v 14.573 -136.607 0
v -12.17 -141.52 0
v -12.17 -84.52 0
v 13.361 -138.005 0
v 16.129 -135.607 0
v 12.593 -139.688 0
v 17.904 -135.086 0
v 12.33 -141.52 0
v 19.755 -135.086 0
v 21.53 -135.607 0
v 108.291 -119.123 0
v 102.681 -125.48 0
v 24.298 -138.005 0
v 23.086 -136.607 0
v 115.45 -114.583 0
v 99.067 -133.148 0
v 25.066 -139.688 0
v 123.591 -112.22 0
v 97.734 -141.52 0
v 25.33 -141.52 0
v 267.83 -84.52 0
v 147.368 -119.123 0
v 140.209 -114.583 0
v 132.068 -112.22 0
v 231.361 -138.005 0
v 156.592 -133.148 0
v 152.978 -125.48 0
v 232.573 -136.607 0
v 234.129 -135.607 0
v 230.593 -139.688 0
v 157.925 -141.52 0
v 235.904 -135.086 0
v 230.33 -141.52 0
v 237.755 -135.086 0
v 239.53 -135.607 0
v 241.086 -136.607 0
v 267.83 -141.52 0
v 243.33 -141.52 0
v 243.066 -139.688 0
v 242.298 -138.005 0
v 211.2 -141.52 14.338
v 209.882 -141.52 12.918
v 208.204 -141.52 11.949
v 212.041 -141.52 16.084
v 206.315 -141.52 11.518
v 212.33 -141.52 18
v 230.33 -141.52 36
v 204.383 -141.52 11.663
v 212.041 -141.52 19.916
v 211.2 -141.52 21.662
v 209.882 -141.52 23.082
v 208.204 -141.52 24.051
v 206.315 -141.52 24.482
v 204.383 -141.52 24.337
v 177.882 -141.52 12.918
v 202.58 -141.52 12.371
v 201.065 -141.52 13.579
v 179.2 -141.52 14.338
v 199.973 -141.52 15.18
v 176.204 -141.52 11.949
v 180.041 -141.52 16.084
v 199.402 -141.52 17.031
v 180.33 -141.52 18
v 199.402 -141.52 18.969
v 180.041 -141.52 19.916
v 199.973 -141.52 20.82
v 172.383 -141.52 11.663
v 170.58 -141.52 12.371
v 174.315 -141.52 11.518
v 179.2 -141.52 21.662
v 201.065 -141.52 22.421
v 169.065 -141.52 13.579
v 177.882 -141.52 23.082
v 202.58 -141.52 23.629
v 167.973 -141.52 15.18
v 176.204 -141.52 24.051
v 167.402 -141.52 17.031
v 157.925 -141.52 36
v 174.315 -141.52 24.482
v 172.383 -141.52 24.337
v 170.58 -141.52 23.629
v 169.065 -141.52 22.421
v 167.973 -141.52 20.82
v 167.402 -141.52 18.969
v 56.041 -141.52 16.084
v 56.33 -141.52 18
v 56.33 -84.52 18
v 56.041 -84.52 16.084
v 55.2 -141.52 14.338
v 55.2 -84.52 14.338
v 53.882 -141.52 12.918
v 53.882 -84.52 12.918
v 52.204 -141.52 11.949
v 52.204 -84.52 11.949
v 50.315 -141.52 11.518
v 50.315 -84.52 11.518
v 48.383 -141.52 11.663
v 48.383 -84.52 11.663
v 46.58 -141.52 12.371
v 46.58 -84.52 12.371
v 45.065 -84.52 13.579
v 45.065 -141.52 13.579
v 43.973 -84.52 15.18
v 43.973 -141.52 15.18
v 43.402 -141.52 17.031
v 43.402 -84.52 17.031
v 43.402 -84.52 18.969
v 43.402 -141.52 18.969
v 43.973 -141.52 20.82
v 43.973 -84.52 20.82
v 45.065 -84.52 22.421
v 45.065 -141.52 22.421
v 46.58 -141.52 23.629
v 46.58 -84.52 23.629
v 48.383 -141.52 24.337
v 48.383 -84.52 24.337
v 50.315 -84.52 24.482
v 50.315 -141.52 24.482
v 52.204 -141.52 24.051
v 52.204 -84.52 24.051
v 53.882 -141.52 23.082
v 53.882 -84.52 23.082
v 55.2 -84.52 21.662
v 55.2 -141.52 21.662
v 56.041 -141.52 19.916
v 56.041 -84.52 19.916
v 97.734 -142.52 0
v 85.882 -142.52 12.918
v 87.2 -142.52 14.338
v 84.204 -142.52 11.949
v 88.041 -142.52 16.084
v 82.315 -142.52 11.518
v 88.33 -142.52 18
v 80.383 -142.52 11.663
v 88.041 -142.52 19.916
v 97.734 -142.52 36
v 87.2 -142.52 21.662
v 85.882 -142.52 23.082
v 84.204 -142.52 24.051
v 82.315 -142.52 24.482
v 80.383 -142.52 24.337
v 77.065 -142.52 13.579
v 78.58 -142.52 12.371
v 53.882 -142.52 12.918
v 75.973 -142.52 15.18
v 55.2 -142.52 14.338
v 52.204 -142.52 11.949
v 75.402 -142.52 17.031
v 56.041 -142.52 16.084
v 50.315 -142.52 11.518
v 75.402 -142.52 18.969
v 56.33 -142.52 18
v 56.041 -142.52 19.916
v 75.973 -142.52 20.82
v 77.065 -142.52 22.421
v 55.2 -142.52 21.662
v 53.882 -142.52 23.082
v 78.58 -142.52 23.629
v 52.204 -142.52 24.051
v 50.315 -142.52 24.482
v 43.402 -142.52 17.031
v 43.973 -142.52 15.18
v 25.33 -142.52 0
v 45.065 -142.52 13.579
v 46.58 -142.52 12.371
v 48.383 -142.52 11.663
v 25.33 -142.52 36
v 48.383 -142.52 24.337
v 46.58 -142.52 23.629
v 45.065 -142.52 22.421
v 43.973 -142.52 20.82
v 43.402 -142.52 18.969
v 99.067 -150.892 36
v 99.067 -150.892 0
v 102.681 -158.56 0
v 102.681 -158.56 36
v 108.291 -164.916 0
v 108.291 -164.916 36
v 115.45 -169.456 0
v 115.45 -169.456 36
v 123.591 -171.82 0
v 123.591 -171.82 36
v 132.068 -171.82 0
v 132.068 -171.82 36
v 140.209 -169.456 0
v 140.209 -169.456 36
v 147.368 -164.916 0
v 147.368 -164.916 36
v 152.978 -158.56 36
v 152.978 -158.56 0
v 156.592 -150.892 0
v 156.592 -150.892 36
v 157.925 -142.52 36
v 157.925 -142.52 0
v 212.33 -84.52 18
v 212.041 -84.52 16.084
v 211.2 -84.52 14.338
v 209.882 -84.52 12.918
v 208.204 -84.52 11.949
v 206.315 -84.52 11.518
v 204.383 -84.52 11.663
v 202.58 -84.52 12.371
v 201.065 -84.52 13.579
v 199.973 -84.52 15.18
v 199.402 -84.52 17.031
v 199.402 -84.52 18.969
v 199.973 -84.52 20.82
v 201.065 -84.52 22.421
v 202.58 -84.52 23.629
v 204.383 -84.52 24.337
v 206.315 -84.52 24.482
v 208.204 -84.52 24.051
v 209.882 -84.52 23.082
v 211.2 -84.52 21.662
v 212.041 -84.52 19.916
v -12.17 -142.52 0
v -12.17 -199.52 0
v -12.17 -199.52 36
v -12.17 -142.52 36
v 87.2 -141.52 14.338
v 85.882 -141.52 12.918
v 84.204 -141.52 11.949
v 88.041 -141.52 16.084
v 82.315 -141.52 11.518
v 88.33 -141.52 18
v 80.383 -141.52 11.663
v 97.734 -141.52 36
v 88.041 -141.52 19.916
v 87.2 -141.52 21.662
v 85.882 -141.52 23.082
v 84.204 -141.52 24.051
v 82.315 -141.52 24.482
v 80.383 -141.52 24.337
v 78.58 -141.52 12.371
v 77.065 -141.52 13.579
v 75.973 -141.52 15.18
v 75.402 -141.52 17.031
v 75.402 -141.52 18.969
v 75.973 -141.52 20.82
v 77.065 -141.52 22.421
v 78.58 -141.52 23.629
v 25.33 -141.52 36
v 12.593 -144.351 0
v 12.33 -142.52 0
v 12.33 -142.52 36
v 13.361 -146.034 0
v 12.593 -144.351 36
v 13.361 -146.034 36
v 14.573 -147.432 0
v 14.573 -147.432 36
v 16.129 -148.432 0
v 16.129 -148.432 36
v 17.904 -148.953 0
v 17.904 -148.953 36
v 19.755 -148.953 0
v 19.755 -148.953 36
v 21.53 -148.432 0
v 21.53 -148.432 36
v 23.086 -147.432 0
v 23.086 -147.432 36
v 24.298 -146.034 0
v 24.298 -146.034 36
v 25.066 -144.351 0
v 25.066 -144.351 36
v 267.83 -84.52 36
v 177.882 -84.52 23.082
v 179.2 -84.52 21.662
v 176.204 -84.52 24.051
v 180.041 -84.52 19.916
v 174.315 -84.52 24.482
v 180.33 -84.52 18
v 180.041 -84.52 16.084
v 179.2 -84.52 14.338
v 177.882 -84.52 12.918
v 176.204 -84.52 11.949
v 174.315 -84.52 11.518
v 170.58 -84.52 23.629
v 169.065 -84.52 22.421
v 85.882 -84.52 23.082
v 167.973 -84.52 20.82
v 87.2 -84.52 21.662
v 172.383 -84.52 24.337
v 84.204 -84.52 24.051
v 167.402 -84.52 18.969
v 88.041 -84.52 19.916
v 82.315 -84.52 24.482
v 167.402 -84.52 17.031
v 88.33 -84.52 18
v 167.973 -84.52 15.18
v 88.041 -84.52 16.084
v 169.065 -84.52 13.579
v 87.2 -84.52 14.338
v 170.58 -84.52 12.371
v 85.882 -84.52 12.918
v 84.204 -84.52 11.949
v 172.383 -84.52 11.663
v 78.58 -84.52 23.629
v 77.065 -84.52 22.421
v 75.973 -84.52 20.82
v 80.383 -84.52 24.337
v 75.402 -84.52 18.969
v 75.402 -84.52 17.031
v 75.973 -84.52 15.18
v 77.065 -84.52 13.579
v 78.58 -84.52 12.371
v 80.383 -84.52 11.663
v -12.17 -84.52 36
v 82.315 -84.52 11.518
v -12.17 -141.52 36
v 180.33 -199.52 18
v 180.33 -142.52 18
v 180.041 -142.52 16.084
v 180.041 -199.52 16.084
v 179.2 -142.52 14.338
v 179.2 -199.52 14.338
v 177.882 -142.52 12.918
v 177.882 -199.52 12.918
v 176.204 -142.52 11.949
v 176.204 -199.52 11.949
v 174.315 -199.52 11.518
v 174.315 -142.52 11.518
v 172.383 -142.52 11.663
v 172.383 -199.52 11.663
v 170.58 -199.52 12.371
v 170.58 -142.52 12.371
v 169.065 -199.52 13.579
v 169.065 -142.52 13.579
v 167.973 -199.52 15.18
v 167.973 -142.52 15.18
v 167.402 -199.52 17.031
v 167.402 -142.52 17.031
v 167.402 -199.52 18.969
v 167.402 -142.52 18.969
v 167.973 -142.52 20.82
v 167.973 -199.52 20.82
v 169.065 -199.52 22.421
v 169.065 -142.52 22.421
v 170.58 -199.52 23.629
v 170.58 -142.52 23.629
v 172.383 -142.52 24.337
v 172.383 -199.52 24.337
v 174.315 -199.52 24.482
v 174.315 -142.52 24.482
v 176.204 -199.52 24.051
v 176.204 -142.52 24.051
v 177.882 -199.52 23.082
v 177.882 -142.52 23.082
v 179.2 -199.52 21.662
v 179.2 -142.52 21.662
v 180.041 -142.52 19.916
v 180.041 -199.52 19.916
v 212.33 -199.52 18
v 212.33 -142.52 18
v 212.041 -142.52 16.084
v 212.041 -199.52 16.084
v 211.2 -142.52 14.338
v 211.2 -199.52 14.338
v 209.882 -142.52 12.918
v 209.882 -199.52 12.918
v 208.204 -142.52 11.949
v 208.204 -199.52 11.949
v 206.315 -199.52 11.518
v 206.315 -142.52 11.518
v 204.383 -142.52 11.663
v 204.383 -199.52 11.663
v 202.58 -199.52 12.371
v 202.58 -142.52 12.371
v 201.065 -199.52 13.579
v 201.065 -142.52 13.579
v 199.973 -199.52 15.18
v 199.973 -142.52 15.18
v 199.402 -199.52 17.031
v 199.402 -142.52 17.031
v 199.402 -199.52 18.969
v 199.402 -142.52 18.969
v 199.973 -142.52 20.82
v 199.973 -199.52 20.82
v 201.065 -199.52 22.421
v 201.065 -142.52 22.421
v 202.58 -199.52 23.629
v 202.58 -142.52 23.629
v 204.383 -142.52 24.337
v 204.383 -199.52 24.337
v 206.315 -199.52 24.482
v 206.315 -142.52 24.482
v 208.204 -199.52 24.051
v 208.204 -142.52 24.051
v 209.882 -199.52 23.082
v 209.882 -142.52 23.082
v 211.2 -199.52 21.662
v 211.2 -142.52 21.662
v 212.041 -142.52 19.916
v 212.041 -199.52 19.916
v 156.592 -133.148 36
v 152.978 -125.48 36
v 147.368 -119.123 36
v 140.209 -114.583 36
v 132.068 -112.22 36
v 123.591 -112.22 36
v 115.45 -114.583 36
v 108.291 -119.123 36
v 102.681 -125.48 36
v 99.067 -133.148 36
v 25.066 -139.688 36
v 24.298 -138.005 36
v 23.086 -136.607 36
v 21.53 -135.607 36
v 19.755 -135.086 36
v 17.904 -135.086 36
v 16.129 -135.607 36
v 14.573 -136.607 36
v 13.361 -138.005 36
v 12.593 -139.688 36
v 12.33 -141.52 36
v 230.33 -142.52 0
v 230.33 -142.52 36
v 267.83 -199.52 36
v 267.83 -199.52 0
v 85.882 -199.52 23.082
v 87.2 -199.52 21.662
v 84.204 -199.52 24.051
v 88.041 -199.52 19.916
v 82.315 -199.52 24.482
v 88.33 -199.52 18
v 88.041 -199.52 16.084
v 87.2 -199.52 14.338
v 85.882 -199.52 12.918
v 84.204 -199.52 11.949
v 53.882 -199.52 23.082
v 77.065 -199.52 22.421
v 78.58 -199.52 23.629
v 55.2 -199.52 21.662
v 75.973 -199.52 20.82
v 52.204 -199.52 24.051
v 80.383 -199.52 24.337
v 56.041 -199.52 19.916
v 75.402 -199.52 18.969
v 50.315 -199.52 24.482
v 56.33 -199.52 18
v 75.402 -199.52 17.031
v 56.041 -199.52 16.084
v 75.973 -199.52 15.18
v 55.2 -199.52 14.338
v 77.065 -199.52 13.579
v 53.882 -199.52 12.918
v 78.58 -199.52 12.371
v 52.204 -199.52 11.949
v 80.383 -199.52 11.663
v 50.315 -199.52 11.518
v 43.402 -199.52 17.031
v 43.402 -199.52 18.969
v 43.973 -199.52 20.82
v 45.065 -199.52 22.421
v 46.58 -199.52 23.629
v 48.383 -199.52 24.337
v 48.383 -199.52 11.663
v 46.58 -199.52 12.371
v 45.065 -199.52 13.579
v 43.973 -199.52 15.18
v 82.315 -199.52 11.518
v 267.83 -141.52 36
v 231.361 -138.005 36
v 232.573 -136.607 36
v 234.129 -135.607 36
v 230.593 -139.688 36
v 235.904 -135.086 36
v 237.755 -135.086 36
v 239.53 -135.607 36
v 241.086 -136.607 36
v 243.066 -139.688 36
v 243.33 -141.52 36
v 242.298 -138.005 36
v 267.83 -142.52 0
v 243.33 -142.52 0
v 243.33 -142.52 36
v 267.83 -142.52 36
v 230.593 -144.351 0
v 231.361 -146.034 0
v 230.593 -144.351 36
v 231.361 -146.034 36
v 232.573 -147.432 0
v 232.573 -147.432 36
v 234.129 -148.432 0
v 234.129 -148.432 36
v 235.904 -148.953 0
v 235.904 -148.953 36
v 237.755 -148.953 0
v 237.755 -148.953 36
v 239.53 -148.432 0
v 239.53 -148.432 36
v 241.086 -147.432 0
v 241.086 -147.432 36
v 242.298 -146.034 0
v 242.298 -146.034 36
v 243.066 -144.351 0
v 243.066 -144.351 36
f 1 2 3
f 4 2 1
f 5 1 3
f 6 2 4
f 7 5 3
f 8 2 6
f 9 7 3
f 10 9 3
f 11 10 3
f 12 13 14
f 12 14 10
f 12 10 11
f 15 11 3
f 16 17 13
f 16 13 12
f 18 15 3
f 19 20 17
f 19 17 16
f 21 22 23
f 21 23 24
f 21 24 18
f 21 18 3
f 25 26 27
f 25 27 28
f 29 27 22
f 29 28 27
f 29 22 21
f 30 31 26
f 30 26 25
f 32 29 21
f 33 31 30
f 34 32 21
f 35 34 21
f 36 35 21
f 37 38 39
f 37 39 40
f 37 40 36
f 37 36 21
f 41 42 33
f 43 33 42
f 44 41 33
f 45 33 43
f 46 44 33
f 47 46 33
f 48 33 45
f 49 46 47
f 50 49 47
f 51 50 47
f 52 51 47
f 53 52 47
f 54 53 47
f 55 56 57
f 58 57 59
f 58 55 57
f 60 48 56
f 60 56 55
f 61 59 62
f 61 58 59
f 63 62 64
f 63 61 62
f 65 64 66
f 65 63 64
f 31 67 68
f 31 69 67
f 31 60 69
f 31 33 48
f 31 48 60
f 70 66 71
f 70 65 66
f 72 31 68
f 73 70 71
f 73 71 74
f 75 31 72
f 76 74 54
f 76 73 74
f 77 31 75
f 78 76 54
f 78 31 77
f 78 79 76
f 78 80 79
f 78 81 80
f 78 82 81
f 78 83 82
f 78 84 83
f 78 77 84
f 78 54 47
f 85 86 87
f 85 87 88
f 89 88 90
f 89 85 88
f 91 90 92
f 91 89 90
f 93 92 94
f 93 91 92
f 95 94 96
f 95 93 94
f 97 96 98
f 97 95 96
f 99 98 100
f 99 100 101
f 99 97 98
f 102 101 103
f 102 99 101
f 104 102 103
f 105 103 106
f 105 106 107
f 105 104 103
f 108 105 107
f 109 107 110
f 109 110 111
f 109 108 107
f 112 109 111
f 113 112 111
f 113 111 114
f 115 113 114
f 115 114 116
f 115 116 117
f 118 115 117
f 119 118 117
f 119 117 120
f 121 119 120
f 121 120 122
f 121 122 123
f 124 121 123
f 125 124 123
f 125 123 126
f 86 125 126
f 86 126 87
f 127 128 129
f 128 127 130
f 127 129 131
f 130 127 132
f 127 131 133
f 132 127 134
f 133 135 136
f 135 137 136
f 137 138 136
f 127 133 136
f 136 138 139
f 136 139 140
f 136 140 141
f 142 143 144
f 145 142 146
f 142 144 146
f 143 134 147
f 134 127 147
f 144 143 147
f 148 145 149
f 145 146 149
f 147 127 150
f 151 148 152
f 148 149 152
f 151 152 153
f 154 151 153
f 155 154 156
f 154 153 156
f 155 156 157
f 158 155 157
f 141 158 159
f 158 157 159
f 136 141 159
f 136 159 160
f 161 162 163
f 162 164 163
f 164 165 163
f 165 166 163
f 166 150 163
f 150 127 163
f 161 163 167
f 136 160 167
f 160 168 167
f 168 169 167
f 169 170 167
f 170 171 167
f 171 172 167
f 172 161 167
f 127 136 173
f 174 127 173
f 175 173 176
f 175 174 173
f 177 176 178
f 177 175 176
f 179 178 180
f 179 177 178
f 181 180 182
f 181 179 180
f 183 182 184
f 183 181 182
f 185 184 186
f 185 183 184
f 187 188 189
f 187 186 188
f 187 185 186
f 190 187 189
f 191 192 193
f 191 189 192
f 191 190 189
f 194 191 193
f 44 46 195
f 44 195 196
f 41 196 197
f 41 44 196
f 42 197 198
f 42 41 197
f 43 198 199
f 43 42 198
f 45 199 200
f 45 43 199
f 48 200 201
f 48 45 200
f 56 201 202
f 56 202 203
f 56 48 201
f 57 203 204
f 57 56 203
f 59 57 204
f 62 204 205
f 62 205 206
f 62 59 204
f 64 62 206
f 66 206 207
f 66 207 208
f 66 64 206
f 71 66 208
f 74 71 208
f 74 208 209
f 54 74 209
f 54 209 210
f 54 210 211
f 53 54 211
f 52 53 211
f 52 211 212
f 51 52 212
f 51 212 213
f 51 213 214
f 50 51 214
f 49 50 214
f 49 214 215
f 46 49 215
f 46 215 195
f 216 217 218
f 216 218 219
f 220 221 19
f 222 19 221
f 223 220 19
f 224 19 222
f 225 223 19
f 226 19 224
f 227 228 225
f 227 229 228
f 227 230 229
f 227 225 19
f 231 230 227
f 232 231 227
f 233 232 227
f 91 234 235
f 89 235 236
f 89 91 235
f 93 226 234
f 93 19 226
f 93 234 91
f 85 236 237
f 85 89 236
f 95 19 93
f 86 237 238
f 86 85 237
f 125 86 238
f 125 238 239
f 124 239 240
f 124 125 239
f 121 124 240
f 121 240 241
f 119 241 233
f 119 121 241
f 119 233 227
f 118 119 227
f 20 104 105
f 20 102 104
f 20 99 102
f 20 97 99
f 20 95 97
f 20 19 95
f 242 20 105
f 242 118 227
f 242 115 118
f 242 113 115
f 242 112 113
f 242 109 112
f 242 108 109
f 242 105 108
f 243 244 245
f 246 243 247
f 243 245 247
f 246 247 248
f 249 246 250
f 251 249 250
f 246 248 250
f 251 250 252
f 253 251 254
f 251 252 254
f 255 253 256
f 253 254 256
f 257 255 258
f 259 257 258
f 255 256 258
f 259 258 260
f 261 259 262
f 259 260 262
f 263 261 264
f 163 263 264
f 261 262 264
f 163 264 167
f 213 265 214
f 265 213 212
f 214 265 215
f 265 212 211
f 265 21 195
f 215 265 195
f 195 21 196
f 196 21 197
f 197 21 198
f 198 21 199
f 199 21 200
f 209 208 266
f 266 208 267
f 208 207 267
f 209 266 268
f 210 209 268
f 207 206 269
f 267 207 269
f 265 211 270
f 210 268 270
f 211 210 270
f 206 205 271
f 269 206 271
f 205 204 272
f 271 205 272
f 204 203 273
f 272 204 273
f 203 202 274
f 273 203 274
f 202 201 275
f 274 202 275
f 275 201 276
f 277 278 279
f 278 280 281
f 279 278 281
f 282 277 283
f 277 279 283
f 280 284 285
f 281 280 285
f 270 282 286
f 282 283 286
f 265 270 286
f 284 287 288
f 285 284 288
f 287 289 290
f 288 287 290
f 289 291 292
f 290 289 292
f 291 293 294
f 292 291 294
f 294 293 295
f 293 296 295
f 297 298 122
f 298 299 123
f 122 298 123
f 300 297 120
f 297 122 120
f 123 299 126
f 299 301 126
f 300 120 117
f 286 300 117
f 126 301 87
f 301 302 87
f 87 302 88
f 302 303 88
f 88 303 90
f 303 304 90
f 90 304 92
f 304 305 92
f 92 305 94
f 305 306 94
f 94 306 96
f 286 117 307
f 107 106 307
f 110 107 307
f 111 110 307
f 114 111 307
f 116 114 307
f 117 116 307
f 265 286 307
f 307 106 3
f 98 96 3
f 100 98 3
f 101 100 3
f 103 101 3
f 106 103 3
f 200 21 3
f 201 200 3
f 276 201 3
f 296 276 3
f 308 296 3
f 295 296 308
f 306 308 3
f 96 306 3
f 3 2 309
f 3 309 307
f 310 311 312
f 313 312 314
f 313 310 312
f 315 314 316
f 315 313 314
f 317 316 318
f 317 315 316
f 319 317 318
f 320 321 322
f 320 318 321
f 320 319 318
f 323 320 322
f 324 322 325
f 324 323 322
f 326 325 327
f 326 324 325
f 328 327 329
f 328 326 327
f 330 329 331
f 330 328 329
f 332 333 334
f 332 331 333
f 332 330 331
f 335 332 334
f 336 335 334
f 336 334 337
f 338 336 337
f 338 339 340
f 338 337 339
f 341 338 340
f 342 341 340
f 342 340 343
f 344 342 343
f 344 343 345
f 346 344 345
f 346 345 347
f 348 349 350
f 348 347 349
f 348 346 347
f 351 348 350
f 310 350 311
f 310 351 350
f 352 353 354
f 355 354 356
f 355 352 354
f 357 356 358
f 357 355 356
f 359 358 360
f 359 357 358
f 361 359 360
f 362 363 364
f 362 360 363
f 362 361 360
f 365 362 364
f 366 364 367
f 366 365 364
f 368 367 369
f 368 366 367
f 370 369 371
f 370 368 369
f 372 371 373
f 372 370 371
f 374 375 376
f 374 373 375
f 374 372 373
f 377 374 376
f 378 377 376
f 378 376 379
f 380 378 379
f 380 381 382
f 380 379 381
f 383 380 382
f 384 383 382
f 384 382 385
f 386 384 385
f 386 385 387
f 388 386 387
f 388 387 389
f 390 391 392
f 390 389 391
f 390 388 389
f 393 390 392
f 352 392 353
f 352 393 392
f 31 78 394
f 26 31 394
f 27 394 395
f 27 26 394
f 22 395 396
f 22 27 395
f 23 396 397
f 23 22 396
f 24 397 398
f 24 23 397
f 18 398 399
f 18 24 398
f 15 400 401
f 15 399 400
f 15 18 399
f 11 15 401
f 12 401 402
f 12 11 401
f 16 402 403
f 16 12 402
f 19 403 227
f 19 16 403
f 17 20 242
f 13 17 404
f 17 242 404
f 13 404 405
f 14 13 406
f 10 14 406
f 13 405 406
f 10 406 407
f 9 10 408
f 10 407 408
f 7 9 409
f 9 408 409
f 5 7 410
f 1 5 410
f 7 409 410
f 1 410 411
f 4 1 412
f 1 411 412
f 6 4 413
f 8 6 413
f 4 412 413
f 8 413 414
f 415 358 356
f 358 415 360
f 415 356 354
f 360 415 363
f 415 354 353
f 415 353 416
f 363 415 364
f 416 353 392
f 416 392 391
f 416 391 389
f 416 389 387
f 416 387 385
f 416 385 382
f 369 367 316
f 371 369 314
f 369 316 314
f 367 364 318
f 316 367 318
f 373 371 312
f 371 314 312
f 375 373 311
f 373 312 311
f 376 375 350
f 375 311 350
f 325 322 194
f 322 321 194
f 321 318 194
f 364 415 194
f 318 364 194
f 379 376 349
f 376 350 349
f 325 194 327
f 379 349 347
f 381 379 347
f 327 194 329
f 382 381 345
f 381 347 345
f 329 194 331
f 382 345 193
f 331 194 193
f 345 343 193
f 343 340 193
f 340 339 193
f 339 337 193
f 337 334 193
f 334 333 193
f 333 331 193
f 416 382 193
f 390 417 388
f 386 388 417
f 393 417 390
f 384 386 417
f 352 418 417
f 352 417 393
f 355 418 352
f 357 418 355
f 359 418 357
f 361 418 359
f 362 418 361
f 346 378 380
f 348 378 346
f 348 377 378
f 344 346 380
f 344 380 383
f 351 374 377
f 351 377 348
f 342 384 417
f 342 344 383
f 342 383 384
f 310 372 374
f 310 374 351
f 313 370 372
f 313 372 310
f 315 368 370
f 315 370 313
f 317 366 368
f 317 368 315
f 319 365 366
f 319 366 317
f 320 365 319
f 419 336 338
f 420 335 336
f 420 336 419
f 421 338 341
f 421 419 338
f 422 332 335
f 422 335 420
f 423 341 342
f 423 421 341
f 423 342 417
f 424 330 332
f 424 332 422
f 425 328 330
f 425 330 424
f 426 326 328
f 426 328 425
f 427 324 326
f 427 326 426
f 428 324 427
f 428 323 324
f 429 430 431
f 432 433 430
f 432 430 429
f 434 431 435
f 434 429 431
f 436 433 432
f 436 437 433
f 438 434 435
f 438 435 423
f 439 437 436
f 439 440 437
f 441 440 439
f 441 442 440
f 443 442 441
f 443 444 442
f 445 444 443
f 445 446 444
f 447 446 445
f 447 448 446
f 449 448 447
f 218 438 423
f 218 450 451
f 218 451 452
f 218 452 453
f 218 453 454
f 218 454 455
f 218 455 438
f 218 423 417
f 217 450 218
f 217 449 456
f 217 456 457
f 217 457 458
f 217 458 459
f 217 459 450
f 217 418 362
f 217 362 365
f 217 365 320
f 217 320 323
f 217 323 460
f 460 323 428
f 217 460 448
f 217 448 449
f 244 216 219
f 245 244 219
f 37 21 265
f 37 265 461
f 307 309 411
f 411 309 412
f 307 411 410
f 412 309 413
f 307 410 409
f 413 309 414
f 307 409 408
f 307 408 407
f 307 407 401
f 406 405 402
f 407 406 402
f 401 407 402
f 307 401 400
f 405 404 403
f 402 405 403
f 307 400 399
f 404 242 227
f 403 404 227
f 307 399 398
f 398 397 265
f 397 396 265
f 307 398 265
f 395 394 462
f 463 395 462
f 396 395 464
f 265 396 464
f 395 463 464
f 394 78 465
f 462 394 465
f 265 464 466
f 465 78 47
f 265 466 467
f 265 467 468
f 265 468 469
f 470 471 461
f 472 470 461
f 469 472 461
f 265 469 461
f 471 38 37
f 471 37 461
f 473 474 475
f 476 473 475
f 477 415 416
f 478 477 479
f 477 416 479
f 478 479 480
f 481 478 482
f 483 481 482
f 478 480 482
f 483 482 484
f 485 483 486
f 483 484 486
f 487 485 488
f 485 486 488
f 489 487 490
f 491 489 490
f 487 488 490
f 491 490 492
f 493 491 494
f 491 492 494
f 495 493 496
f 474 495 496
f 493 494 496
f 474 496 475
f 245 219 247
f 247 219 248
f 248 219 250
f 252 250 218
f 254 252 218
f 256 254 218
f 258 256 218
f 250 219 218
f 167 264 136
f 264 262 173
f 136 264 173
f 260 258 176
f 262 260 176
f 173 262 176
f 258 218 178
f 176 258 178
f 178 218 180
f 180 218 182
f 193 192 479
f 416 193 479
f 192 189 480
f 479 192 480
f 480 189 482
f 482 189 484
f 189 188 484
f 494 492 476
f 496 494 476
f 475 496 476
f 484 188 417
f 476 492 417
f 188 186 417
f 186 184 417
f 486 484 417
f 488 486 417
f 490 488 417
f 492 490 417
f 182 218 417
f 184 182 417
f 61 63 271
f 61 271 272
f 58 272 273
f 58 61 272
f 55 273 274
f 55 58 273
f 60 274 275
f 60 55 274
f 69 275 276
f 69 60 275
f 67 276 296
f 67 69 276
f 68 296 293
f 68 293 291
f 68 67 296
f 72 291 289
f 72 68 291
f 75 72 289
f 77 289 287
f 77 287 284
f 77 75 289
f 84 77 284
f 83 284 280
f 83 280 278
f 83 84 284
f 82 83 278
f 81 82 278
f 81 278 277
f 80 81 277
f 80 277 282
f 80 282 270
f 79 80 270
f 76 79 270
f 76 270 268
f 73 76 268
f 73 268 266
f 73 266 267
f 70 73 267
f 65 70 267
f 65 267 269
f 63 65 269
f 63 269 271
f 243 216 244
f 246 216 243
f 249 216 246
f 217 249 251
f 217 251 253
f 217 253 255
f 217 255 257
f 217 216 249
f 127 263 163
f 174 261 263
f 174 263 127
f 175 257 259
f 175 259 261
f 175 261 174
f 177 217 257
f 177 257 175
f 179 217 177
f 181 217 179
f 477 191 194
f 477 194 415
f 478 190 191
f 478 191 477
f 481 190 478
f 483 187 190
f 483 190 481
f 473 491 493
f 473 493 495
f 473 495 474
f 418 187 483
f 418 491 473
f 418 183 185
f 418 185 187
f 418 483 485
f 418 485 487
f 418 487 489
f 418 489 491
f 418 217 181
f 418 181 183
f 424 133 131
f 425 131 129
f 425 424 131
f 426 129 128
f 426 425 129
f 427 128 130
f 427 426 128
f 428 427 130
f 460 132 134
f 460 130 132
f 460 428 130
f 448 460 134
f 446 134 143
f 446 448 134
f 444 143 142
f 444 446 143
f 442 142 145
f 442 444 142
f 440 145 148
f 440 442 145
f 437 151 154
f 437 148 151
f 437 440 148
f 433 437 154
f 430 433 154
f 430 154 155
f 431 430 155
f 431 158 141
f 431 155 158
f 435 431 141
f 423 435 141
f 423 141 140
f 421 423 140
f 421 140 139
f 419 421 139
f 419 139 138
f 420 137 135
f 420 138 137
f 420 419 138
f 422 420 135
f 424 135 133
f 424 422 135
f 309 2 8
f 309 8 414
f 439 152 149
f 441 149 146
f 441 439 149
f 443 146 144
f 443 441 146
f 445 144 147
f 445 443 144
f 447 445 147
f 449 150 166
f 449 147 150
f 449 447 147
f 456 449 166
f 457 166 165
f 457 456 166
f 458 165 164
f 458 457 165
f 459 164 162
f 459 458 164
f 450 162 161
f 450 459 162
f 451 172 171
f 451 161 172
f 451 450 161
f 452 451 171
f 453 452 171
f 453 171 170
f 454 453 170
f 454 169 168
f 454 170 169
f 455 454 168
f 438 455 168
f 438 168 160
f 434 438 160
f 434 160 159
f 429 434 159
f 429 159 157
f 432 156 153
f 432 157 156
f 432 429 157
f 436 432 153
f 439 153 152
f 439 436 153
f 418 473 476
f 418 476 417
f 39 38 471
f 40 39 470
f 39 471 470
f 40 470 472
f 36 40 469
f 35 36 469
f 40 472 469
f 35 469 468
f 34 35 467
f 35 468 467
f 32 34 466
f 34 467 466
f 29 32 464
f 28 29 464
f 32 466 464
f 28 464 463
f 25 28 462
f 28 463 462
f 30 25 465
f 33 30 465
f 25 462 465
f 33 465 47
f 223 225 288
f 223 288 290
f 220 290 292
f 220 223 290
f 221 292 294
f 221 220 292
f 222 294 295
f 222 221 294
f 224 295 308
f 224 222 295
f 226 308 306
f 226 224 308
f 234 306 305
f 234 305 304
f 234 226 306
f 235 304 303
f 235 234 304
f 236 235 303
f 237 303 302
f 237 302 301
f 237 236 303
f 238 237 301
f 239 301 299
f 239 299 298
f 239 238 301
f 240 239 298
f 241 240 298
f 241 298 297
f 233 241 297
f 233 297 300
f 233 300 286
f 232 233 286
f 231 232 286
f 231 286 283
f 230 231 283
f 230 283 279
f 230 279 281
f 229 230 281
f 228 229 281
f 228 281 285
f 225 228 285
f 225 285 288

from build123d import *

# Parameters (mm, degrees)
BOSS_EXTRUDE1_DEPTH = 36
SKETCH4_R           = 6.5
CUT_EXTRUDE3_DEPTH  = 58.5
SKETCH5_W           = 36
SKETCH5_H           = 1
CUT_EXTRUDE5_DEPTH  = 281
CUT_EXTRUDE6_DEPTH  = 37


with BuildPart() as part:
    # Sketch1 → Boss-Extrude1 (new body)
    with BuildSketch(Plane.XY):
        with BuildLine():
            Line((267.829500207, -84.51965646), (-12.170499793, -84.51965646))
            Line((-12.170499793, -84.51965646), (-12.170499793, -142.01965646))
            Line((-12.170499793, -142.01965646), (97.729500207, -142.01965646))
            ThreePointArc((97.729500207, -142.01965646), (127.829500207, -111.91965646), (157.929500207, -142.01965646))
            Line((157.929500207, -142.01965646), (267.829500207, -142.01965646))
            Line((267.829500207, -142.01965646), (267.829500207, -84.51965646))
        make_face()
    boss_extrude1 = extrude(amount=BOSS_EXTRUDE1_DEPTH)

    # Sketch4 → Cut-Extrude3 (cut, through all)
    with BuildSketch(Plane(origin=(0, -84.51965646, 0), x_dir=(1, 0, 0), z_dir=(0, 1, 0))):
        with Locations((205.829500207, -18)):
            Circle(SKETCH4_R)
        with Locations((173.829500207, -18)):
            Circle(SKETCH4_R)
        with Locations((81.829500207, -18)):
            Circle(SKETCH4_R)
        with Locations((49.829500207, -18)):
            Circle(SKETCH4_R)
    cut_extrude3 = extrude(amount=-CUT_EXTRUDE3_DEPTH, mode=Mode.SUBTRACT)

    # Mirror1: Boss-Extrude1, Cut-Extrude3 across plane
    add(boss_extrude1.mirror(Plane(origin=(0, -142.01965646, 36), x_dir=(0, 0, 1), z_dir=(0, 1, 0))))
    add(cut_extrude3.mirror(Plane(origin=(0, -142.01965646, 36), x_dir=(0, 0, 1), z_dir=(0, 1, 0))), mode=Mode.SUBTRACT)

    # Sketch5 → Cut-Extrude5 (cut, through all)
    with BuildSketch(Plane.ZY.offset(12.170499793)):
        with Locations((18, -142.01965646)):
            Rectangle(SKETCH5_W, SKETCH5_H)
    extrude(amount=-CUT_EXTRUDE5_DEPTH, mode=Mode.SUBTRACT)

    # Sketch3 → Cut-Extrude6 (cut, through all)
    with BuildSketch(Plane.XY.offset(36)):
        with BuildLine():
            ThreePointArc((25.329500207, -141.51965646), (18.829500207, -135.01965646), (12.329500207, -141.51965646))
            Line((12.329500207, -141.51965646), (25.329500207, -141.51965646))
        make_face()
        with BuildLine():
            Line((25.329500207, -142.51965646), (12.329500207, -142.51965646))
            ThreePointArc((12.329500207, -142.51965646), (18.829500207, -149.01965646), (25.329500207, -142.51965646))
        make_face()
        with BuildLine():
            ThreePointArc((243.329500207, -141.51965646), (236.829500207, -135.01965646), (230.329500207, -141.51965646))
            Line((230.329500207, -141.51965646), (243.329500207, -141.51965646))
        make_face()
        with BuildLine():
            Line((243.329500207, -142.51965646), (230.329500207, -142.51965646))
            ThreePointArc((230.329500207, -142.51965646), (236.829500207, -149.01965646), (243.329500207, -142.51965646))
        make_face()
    extrude(amount=-CUT_EXTRUDE6_DEPTH, mode=Mode.SUBTRACT)


solid = part.part
